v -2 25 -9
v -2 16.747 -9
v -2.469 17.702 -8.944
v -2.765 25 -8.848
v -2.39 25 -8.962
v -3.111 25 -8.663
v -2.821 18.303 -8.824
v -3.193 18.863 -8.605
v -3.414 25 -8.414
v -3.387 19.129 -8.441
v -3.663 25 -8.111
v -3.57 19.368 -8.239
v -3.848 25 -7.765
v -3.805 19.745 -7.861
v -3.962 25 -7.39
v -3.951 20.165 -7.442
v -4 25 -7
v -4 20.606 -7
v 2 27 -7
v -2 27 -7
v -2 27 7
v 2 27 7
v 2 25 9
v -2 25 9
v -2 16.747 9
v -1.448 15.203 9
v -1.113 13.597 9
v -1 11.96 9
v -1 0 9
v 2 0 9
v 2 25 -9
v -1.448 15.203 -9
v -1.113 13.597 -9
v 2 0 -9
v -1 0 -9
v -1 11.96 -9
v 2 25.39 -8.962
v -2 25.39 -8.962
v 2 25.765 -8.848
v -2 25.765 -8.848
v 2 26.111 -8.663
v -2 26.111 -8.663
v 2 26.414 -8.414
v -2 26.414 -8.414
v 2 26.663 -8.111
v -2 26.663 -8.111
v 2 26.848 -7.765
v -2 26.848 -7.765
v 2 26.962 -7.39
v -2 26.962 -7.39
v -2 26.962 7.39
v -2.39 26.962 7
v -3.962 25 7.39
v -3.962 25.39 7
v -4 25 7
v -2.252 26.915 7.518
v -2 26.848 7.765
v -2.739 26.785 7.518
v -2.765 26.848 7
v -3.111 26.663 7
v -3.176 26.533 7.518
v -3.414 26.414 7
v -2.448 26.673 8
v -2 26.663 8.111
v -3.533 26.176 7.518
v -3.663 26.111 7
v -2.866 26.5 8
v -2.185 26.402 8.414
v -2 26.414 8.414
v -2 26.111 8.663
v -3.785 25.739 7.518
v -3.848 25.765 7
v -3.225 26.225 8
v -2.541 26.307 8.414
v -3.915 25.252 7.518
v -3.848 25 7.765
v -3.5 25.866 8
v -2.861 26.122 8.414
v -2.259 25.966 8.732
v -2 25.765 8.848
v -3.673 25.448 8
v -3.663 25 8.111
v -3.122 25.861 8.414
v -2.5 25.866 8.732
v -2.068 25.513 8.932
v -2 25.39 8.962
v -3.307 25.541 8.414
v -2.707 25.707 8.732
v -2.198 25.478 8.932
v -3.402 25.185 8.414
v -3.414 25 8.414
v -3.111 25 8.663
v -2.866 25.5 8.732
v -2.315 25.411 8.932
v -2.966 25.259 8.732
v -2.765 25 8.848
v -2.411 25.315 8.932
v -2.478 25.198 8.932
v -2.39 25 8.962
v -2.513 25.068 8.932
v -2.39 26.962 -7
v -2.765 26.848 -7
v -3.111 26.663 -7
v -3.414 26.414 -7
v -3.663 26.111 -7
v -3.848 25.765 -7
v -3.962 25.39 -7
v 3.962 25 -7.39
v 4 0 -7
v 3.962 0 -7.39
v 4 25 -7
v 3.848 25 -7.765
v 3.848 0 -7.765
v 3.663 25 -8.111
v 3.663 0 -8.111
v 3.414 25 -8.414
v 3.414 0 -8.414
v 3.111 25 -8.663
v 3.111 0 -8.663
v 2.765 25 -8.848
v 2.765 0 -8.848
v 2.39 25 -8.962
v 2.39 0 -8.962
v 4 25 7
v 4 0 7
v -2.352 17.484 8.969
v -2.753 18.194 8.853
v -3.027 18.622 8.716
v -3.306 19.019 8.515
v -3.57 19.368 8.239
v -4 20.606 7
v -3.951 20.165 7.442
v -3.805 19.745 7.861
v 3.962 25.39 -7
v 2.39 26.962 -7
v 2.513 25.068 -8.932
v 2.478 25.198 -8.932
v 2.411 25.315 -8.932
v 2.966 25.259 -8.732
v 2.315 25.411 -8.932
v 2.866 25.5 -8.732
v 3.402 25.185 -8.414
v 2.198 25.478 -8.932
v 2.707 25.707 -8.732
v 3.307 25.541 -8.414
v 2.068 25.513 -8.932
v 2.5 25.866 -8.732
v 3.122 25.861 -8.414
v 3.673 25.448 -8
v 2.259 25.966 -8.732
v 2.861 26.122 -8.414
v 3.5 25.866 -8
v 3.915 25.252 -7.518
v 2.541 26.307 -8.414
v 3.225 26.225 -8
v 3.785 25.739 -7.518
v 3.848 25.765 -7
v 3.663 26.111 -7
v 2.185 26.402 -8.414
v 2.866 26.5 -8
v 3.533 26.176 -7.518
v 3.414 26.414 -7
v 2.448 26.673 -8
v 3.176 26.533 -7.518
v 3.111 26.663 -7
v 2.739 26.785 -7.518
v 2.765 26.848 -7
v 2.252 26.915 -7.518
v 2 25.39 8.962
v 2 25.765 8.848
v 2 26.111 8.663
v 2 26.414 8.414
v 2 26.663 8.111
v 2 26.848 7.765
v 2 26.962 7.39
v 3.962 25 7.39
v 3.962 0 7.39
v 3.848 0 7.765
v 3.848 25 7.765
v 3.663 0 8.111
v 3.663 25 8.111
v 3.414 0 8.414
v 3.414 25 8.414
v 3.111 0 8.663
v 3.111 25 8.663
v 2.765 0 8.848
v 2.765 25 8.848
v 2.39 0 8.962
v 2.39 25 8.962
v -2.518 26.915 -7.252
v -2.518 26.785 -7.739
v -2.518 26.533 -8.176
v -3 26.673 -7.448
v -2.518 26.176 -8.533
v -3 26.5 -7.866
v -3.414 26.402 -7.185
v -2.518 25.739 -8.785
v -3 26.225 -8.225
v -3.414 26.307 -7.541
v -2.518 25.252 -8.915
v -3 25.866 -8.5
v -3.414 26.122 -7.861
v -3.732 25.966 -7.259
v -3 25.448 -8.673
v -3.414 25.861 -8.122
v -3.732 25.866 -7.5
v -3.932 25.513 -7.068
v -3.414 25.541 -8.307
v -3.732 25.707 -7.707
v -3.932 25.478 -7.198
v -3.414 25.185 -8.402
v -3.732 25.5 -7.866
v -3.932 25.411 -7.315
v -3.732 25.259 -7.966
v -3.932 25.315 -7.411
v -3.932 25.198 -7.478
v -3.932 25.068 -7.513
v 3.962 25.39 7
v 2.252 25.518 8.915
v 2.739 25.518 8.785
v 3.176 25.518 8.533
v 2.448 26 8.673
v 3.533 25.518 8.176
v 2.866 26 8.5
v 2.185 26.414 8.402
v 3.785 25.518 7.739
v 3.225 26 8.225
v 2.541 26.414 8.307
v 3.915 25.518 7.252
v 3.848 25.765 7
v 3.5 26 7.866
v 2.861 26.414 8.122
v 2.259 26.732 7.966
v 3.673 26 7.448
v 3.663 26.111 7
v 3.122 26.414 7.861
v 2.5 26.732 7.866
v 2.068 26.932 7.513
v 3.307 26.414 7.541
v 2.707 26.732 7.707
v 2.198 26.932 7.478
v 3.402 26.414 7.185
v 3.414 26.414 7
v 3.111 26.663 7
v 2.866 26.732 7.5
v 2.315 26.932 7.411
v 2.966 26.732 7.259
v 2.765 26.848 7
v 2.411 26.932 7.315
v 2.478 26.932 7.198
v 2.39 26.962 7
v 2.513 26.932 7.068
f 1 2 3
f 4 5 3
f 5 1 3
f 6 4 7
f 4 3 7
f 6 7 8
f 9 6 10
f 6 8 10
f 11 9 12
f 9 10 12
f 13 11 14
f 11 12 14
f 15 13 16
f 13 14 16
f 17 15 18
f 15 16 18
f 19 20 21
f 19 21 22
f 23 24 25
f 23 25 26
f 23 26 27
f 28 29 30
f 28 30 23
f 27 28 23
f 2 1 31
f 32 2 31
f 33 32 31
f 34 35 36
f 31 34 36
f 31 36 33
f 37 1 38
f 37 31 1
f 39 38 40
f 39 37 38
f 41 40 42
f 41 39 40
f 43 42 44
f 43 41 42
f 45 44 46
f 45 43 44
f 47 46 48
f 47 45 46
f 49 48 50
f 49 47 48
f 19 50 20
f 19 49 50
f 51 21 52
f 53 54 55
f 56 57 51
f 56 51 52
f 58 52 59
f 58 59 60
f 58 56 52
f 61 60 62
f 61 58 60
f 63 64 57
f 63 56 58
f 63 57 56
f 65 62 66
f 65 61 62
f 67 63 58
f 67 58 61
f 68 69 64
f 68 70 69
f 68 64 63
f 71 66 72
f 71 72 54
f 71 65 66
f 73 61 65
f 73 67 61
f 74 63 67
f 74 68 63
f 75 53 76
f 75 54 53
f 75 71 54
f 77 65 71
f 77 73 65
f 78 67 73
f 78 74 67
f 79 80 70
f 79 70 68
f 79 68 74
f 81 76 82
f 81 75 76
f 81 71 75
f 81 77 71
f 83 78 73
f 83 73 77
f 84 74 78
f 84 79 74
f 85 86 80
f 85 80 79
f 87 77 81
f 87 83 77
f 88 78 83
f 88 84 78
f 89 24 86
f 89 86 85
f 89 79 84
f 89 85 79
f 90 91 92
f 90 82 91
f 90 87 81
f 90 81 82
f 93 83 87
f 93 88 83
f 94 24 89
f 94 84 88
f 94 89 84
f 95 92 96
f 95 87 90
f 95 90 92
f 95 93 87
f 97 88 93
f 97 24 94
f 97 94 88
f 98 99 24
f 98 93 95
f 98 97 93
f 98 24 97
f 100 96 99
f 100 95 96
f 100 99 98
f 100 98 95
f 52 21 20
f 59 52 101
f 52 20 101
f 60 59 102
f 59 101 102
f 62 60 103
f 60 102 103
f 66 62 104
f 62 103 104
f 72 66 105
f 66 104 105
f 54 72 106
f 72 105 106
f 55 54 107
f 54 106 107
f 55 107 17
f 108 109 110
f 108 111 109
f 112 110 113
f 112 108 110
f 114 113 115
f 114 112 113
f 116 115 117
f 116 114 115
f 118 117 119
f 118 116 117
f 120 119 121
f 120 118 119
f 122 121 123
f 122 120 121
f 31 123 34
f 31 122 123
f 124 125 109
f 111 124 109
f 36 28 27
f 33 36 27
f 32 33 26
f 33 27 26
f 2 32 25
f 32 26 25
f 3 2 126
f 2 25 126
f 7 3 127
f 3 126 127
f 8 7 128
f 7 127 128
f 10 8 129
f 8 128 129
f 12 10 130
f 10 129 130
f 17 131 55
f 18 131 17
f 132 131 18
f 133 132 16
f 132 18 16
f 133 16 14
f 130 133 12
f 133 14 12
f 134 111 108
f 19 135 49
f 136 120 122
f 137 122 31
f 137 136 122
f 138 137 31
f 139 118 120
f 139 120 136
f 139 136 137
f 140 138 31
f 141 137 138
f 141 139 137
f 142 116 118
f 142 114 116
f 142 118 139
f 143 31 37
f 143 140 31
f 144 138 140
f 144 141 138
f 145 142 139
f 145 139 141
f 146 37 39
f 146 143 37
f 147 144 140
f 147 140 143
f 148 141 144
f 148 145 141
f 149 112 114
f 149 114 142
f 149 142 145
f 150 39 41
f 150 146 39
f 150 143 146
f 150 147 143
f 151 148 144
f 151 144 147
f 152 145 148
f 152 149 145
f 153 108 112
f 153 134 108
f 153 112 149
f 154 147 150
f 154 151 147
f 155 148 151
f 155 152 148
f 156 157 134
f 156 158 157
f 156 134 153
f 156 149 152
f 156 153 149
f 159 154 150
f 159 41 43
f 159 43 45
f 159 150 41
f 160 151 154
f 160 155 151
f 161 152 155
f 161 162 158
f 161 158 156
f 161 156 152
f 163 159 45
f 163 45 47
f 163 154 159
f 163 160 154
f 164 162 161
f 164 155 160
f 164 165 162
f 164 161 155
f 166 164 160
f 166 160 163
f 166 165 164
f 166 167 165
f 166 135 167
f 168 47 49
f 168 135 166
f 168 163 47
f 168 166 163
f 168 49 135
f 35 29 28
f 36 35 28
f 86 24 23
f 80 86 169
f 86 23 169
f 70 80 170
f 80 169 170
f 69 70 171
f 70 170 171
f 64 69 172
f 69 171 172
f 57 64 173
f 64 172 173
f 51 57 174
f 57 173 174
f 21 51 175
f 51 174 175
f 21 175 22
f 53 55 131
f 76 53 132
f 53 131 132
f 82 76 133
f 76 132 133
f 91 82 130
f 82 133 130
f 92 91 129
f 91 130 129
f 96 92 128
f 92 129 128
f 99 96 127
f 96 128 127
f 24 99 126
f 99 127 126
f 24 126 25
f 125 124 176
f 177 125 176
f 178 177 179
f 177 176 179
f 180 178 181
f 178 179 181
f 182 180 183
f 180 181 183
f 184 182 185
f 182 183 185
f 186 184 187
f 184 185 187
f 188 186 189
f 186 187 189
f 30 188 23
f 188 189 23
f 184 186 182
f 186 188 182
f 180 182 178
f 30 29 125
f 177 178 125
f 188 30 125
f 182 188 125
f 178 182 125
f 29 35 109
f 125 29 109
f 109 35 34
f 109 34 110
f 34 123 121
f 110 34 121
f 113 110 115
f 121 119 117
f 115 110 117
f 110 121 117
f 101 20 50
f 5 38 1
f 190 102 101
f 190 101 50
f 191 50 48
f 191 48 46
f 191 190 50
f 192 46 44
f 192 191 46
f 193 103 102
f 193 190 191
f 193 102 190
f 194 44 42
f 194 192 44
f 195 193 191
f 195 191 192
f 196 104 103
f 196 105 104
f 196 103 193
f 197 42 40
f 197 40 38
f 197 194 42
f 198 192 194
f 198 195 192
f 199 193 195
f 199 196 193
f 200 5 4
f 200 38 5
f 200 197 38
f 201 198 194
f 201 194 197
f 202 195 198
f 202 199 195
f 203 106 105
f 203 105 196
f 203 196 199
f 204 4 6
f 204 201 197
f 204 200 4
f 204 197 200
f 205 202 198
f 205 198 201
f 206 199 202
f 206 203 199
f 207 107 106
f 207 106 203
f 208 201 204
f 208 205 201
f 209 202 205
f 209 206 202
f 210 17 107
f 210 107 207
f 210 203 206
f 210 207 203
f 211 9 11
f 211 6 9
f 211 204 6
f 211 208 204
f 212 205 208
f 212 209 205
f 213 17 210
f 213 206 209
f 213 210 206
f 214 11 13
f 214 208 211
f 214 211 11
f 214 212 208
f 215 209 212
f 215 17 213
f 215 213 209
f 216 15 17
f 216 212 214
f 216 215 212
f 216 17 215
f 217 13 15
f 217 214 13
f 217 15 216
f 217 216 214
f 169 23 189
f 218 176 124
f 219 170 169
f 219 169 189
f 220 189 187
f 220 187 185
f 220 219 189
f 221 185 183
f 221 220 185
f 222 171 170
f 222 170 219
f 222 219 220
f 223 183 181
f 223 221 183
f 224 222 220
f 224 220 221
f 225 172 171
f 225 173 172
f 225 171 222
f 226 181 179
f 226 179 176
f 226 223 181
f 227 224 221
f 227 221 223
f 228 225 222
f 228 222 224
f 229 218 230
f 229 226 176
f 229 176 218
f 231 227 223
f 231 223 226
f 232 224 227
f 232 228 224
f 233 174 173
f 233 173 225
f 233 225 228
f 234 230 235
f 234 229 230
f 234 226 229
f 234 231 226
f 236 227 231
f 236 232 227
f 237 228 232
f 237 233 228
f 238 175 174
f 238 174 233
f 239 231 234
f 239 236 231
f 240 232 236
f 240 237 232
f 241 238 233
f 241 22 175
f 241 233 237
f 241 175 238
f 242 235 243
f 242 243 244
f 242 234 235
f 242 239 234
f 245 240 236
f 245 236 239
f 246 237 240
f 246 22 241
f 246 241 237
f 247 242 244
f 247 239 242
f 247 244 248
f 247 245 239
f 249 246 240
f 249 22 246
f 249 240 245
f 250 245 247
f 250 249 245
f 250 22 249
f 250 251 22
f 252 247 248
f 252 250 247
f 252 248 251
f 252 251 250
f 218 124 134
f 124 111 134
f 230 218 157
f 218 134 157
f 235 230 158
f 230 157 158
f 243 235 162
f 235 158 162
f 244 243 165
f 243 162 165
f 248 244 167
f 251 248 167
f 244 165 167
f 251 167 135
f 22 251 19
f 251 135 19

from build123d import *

# Parameters (mm, degrees)
SKETCH1_W           = 8
SKETCH1_H           = 18
BOSS_EXTRUDE1_DEPTH = 27
SKETCH2_R           = 11.96
CUT_EXTRUDE1_DEPTH  = 30
SKETCH3_W           = 3.757980454
SKETCH3_H           = 11.96
CUT_EXTRUDE2_DEPTH  = 30
FILLET1_R           = 2
FILLET2_R           = 2
FILLET3_R           = 2


with BuildPart() as part:
    # Sketch1 → Boss-Extrude1 (new body)
    with BuildSketch(Plane(origin=(0, 0, 0), x_dir=(1, 0, 0), z_dir=(0, 1, 0))):
        Rectangle(SKETCH1_W, SKETCH1_H)
    extrude(amount=BOSS_EXTRUDE1_DEPTH)

    # Sketch2 → Cut-Extrude1 (cut)
    with BuildSketch(Plane.XY.offset(9)):
        with Locations((-12.96, 11.96)):
            Circle(SKETCH2_R)
    extrude(amount=-CUT_EXTRUDE1_DEPTH, mode=Mode.SUBTRACT)

    # Sketch3 → Cut-Extrude2 (cut)
    with BuildSketch(Plane.XY.offset(9)):
        with Locations((-2.878990227, 5.98)):
            Rectangle(SKETCH3_W, SKETCH3_H)
    extrude(amount=-CUT_EXTRUDE2_DEPTH, mode=Mode.SUBTRACT)

    # Fillet1
    fillet1_edges = [part.edges().sort_by_distance(p)[0] for p in [
        (4, 13.5, 9),
    ]]
    fillet(fillet1_edges, radius=FILLET1_R)

    # Fillet2
    fillet2_edges = [part.edges().sort_by_distance(p)[0] for p in [
        (-4, 27, 0),
        (-1, 27, 9),
        (4, 27, -1),
        (3.414213562, 27, 8.414213562),
        (4, 13.5, -9),
        (0, 27, -9),
    ]]
    fillet(fillet2_edges, radius=FILLET2_R)

    # Fillet3
    # the kernel refuses this fillet: 2 mm, written as the material it takes off along each edge
    with BuildSketch(Plane(origin=(-2, 25, -7), x_dir=(0, 0, -1), z_dir=(-1, 0, 0))) as fillet3_piece_1_section:
        Polygon((0, 0), (FILLET3_R, 0), (FILLET3_R, -FILLET3_R), (0, -FILLET3_R), align=None)
    fillet3_piece_1 = extrude(amount=FILLET3_R, mode=Mode.PRIVATE)
    fillet3_piece_1 = fillet3_piece_1 - Plane(origin=(-2, 25, -7), x_dir=(0, -0.7071067811865475, 0.7071067811865475), z_dir=(-1, 0, 0)) * Sphere(FILLET3_R, mode=Mode.PRIVATE)
    add(fillet3_piece_1, mode=Mode.SUBTRACT)
    with BuildSketch(Plane(origin=(-2, 25, 7), x_dir=(-1, 0, 0), z_dir=(0, 0, 1))) as fillet3_piece_2_section:
        Polygon((0, 0), (FILLET3_R, 0), (FILLET3_R, -FILLET3_R), (0, -FILLET3_R), align=None)
    fillet3_piece_2 = extrude(amount=FILLET3_R, mode=Mode.PRIVATE)
    fillet3_piece_2 = fillet3_piece_2 - Plane(origin=(-2, 25, 7), x_dir=(0.7071067811865475, -0.7071067811865475, 0), z_dir=(0, 0, 1)) * Sphere(FILLET3_R, mode=Mode.PRIVATE)
    add(fillet3_piece_2, mode=Mode.SUBTRACT)
    with BuildSketch(Plane(origin=(-4, 19.882120928, -10.810664001), x_dir=(0, 1, 0), z_dir=(0, 0, 1))) as fillet3_piece_3:
        with BuildLine():
            CenterArc((0.7242656, -2), FILLET3_R, 90, 38.270045509)
            ThreePointArc((-0.514471725, -0.429799427), (-0.254223892, -0.218505055), (0, 0))
            Line((0, 0), (0.7242656, 0))
        make_face()
    extrude(amount=21.621328002, mode=Mode.SUBTRACT)
    with BuildSketch(Plane(origin=(-4, 14.882120928, 9), x_dir=(1, 0, 0), z_dir=(0, 1, 0)), Plane(origin=(-4, 14.882120928, -9), x_dir=(0, 0, 1), z_dir=(0, 1, 0))) as fillet3_piece_4:
        with BuildLine():
            CenterArc((FILLET3_R, FILLET3_R), FILLET3_R, 180, 90)
            Line((0, FILLET3_R), (0, 0))
            Line((0, 0), (FILLET3_R, 0))
        make_face()
    extrude(amount=10.117879072, mode=Mode.SUBTRACT)


solid = part.part
